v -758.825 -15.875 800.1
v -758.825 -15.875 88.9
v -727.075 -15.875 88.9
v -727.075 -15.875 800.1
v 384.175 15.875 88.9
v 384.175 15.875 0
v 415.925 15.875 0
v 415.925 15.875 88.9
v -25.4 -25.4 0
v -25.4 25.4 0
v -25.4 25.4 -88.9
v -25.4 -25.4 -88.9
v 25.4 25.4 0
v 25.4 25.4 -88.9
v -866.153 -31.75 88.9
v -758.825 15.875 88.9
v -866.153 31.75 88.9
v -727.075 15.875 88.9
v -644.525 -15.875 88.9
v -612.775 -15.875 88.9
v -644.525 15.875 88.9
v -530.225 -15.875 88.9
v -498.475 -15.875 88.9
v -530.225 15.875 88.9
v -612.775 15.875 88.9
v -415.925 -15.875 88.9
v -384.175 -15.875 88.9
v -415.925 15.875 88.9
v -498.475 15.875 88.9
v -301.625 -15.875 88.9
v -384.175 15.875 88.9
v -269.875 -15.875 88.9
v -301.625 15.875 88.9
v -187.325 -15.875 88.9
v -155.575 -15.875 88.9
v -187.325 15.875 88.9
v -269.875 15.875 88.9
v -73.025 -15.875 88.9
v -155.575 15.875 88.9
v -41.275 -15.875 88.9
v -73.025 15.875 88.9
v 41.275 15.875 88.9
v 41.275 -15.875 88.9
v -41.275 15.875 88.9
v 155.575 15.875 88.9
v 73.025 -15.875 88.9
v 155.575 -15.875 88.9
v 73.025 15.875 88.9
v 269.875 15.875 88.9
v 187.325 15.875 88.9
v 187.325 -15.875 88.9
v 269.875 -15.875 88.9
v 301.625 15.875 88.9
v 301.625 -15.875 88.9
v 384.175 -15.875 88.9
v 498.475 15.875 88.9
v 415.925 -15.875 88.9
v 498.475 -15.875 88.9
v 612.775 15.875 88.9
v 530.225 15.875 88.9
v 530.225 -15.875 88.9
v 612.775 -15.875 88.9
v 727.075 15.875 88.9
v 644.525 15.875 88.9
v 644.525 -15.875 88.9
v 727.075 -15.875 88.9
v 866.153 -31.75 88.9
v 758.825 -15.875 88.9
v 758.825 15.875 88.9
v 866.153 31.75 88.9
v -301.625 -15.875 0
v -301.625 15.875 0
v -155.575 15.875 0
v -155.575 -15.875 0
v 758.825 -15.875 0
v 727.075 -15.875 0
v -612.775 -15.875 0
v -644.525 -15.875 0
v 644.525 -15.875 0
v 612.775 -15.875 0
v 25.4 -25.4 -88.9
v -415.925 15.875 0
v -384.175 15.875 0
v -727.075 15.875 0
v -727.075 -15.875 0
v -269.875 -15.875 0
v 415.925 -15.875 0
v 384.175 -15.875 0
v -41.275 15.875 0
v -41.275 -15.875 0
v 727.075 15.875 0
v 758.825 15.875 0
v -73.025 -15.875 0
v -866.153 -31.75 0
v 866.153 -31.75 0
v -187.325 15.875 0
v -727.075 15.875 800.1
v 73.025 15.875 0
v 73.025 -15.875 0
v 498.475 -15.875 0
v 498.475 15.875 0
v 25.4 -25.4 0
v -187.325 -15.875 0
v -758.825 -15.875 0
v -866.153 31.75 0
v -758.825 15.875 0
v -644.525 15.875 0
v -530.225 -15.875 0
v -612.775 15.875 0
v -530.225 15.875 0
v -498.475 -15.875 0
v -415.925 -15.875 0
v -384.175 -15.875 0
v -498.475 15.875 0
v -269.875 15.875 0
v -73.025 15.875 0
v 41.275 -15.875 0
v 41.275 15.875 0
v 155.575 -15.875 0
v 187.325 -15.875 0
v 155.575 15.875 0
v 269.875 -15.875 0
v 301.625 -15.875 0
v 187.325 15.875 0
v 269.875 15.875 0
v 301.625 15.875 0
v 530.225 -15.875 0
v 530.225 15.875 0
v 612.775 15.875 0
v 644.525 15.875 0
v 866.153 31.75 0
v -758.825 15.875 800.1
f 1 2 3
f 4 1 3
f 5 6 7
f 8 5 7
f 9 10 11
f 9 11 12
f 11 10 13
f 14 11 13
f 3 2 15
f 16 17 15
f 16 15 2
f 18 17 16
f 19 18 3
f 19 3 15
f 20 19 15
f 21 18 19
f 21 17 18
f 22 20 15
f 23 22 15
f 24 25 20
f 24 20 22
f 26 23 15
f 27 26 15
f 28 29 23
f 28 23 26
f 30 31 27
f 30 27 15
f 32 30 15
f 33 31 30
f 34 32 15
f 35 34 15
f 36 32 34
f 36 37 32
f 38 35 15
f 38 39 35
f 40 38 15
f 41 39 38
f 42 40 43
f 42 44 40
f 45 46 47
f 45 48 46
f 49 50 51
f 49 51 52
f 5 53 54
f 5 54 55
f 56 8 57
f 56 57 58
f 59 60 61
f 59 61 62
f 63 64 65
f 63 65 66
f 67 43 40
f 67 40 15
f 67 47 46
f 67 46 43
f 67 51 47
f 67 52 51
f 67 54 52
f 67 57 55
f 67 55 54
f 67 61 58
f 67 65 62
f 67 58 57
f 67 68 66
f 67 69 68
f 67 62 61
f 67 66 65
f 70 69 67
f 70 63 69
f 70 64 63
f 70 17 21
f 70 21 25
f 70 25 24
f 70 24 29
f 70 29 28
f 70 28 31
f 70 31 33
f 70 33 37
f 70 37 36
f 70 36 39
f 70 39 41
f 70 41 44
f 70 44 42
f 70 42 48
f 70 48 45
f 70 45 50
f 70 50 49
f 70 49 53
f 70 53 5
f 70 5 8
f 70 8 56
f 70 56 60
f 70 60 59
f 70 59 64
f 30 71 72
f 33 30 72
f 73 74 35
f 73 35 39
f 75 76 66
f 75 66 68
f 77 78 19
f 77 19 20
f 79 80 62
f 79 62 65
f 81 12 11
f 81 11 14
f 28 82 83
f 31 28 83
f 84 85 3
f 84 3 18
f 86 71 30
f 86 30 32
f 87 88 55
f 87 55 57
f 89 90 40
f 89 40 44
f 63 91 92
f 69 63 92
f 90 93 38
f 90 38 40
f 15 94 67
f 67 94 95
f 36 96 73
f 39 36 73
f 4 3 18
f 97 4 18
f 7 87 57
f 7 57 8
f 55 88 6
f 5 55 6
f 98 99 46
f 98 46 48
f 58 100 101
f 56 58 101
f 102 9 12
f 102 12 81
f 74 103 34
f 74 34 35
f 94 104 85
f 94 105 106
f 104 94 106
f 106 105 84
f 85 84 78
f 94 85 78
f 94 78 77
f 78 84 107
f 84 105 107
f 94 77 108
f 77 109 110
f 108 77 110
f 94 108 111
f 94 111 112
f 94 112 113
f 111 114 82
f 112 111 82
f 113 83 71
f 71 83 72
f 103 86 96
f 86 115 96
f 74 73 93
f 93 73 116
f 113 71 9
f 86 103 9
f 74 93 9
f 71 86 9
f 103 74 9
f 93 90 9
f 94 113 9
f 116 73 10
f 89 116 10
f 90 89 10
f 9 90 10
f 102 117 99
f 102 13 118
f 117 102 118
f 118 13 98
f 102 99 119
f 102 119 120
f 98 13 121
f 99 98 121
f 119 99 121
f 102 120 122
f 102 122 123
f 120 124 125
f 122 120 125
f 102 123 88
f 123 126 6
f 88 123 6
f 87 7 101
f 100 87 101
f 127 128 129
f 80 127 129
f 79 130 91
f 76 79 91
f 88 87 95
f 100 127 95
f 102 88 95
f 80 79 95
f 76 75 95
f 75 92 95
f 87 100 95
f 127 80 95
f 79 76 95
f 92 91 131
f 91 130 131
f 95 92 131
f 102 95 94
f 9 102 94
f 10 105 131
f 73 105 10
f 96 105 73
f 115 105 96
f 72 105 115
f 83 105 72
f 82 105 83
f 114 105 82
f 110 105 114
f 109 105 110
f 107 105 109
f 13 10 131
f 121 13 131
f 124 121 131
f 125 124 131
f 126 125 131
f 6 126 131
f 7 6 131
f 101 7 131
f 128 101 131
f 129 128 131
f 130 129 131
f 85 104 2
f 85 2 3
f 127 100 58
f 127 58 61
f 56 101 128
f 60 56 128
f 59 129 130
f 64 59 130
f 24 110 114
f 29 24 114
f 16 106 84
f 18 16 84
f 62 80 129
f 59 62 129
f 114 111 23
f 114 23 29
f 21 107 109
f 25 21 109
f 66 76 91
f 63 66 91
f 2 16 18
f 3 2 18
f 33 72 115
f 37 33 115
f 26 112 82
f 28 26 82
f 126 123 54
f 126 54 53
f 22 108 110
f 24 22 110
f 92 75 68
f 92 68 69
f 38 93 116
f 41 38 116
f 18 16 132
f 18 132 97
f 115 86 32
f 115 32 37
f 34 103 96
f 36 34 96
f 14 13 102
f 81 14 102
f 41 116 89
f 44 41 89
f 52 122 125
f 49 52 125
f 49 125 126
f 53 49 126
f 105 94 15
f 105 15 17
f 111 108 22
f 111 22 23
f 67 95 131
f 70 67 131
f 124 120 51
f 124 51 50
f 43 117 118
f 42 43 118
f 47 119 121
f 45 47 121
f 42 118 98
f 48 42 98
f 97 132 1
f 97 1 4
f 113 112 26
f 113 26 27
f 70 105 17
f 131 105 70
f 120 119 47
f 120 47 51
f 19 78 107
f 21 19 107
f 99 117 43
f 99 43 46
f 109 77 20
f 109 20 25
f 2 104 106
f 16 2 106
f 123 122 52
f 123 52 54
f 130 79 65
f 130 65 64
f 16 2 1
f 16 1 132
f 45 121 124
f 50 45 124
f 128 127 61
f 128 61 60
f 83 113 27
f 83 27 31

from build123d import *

# Parameters (mm, degrees)
F0_W     = 1732.3054
F0_H     = 63.5
F0_W_2   = 31.75
F0_H_2   = 31.75
F1_DEPTH = 88.9
F3_W     = 50.8
F3_H     = 50.8
F4_DEPTH = 88.9
F2_W     = 31.75
F2_H     = 31.75
F5_DEPTH = 711.2


with BuildPart() as f1:
    # F0 (on Top) → F1 (new body)
    with BuildSketch(Plane.XY):
        Rectangle(F0_W, F0_H)
        with Locations((-742.95, 0)):
            Rectangle(F0_W_2, F0_H_2, mode=Mode.SUBTRACT)
        with Locations((-628.65, 0)):
            Rectangle(F0_W_2, F0_H_2, mode=Mode.SUBTRACT)
        with Locations((-514.35, 0)):
            Rectangle(F0_W_2, F0_H_2, mode=Mode.SUBTRACT)
        with Locations((-400.05, 0)):
            Rectangle(F0_W_2, F0_H_2, mode=Mode.SUBTRACT)
        with Locations((-285.75, 0)):
            Rectangle(F0_W_2, F0_H_2, mode=Mode.SUBTRACT)
        with Locations((-171.45, 0)):
            Rectangle(F0_W_2, F0_H_2, mode=Mode.SUBTRACT)
        with Locations((-57.15, 0)):
            Rectangle(F0_W_2, F0_H_2, mode=Mode.SUBTRACT)
        with Locations((57.15, 0)):
            Rectangle(F0_W_2, F0_H_2, mode=Mode.SUBTRACT)
        with Locations((171.45, 0)):
            Rectangle(F0_W_2, F0_H_2, mode=Mode.SUBTRACT)
        with Locations((285.75, 0)):
            Rectangle(F0_W_2, F0_H_2, mode=Mode.SUBTRACT)
        with Locations((400.05, 0)):
            Rectangle(F0_W_2, F0_H_2, mode=Mode.SUBTRACT)
        with Locations((514.35, 0)):
            Rectangle(F0_W_2, F0_H_2, mode=Mode.SUBTRACT)
        with Locations((628.65, 0)):
            Rectangle(F0_W_2, F0_H_2, mode=Mode.SUBTRACT)
        with Locations((742.95, 0)):
            Rectangle(F0_W_2, F0_H_2, mode=Mode.SUBTRACT)
    extrude(amount=F1_DEPTH)

    # F3 (on face) → F4 (join)
    with BuildSketch(Plane(origin=(0, 0, 0), x_dir=(1, 0, 0), z_dir=(0, 0, -1))):
        Rectangle(F3_W, F3_H)
    extrude(amount=F4_DEPTH)


with BuildPart() as f5:
    # F2 (on face) → F5 (new body)
    with BuildSketch(Plane.XY.offset(88.9)):
        with Locations((-742.95, 0)):
            Rectangle(F2_W, F2_H)
    extrude(amount=F5_DEPTH)


solid = Compound([f1.part, f5.part])
